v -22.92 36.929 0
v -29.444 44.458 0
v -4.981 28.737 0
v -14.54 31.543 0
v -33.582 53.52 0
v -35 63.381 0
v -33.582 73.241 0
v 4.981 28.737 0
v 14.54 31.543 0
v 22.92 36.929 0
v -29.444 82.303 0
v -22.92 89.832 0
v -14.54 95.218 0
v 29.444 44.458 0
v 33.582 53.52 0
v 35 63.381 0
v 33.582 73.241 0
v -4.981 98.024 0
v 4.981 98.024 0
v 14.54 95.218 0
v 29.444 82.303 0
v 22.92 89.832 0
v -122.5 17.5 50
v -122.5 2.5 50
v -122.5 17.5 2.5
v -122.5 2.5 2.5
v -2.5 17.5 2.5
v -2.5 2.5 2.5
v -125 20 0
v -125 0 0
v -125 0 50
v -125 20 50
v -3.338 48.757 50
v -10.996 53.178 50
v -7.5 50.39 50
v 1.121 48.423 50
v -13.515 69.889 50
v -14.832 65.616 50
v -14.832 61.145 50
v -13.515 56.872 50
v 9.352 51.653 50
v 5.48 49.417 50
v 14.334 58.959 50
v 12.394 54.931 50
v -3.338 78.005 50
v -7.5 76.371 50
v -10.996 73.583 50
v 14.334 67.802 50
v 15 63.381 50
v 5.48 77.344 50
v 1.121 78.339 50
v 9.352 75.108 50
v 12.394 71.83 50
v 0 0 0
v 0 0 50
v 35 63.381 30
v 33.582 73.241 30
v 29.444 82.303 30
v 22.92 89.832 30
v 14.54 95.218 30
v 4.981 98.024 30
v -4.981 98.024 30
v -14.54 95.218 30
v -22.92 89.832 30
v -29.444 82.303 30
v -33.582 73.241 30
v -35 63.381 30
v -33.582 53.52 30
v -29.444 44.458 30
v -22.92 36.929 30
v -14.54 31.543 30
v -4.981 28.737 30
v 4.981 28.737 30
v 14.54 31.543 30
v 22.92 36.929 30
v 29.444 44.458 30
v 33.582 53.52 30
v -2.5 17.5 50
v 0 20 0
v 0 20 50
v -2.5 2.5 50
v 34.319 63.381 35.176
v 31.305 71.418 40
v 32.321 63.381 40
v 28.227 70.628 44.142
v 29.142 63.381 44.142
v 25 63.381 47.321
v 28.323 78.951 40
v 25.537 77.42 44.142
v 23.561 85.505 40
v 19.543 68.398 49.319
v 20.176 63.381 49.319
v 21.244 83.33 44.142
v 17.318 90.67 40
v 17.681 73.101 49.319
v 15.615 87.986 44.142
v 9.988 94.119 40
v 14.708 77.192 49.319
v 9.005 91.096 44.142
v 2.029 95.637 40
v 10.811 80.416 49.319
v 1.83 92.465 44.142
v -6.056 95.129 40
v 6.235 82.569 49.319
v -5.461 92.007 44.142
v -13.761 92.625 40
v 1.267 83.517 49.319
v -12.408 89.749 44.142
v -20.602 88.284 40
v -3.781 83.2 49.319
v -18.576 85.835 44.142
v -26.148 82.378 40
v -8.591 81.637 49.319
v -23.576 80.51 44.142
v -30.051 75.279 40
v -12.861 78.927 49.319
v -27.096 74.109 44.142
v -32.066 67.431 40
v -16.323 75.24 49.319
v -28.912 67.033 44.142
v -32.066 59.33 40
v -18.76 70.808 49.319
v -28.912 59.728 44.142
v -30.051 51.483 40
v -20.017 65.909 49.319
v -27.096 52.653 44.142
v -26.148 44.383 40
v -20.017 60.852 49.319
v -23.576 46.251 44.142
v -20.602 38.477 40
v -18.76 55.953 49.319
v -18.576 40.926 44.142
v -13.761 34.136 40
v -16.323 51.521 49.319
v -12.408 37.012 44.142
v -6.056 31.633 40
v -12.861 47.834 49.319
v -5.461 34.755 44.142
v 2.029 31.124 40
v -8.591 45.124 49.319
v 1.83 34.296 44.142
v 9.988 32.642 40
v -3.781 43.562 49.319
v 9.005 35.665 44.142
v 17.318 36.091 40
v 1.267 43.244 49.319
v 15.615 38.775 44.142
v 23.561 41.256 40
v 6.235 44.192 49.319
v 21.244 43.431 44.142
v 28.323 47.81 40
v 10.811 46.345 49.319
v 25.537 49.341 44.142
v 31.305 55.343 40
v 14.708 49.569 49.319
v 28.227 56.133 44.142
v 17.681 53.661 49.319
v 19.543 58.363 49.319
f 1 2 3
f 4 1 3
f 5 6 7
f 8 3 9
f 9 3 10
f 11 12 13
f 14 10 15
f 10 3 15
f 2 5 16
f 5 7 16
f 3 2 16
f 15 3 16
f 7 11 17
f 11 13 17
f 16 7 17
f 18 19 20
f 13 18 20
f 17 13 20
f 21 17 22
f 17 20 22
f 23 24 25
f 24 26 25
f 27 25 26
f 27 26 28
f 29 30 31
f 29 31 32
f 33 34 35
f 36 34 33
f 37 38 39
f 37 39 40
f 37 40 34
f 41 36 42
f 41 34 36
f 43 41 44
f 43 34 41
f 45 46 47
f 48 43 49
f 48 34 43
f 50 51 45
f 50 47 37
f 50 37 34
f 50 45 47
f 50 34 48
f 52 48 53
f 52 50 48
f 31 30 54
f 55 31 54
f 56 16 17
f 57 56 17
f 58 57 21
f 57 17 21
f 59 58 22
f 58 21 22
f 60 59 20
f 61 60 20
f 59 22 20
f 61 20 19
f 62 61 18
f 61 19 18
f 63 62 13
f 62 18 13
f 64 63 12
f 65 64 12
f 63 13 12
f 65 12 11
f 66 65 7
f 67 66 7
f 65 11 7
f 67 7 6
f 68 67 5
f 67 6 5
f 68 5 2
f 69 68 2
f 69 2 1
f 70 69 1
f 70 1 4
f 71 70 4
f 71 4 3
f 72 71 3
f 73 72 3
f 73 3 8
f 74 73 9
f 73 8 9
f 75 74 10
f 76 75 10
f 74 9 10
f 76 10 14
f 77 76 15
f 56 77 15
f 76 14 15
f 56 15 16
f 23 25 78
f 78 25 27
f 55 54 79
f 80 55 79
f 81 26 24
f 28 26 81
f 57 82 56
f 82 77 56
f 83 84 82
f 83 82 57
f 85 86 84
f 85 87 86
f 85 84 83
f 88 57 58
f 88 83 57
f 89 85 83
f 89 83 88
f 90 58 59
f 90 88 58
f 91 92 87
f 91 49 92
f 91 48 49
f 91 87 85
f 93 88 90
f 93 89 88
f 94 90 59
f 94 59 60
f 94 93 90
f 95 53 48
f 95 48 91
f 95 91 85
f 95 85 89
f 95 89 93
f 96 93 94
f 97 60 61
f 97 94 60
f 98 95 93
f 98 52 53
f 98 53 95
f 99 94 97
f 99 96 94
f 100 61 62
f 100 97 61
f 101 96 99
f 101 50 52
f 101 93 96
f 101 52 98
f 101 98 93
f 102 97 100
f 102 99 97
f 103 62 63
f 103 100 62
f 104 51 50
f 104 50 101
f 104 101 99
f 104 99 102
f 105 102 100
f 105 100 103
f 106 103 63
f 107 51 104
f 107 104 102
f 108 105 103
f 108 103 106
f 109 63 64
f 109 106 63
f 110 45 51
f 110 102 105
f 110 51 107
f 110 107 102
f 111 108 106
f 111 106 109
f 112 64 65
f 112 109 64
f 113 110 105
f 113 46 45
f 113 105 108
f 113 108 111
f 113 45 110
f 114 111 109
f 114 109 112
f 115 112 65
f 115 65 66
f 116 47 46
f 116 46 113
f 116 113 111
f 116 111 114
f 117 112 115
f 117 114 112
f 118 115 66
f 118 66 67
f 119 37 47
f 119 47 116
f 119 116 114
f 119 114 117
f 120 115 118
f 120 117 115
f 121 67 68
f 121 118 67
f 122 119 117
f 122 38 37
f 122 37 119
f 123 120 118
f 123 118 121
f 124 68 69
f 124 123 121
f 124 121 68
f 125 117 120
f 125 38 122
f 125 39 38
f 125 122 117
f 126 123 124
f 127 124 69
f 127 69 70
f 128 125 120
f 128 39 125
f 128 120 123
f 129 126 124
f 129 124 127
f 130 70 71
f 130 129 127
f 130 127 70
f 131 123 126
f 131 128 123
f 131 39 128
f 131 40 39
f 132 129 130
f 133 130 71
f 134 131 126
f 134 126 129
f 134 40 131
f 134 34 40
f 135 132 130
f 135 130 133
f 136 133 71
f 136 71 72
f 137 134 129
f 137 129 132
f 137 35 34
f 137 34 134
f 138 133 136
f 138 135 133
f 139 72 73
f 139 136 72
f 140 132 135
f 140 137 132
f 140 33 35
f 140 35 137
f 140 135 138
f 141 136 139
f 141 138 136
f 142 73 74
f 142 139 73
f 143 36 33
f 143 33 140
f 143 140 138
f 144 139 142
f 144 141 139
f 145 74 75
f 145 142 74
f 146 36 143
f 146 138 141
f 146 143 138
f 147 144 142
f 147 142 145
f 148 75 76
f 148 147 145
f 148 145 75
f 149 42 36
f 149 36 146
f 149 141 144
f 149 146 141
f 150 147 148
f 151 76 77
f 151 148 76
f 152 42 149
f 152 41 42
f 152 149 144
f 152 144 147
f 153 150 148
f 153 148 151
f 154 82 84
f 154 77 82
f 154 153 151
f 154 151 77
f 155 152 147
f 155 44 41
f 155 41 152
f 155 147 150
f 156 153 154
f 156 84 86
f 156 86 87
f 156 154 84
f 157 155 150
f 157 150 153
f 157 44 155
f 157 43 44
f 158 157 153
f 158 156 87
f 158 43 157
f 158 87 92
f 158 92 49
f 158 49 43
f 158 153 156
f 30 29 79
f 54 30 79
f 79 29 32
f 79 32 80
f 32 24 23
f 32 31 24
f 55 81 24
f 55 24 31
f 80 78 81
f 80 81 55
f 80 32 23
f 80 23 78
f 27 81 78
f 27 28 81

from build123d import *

# Parameters (mm, degrees)
F0_W     = 125
F0_H     = 20
F1_DEPTH = 50
F0_R     = 35
F2_R     = 20
F3_T     = -2.5


with BuildPart() as f1:
    # F0 (on Top) → F1 (new body)
    with BuildSketch(Plane.XY):
        with Locations((-62.5, 10)):
            Rectangle(F0_W, F0_H)
    extrude(amount=F1_DEPTH)

    # F3
    f3_openings = [f1.faces().sort_by_distance(p)[0] for p in [
        (-62.5, 10, 50),
    ]]
    offset(amount=F3_T, openings=f3_openings)


with BuildPart() as f1b:
    # F0 (on Top) → F1, piece 2 (new body)
    with BuildSketch(Plane.XY):
        with Locations((0, 63.3805897062)):
            Circle(F0_R)
    extrude(amount=F1_DEPTH)

    # F2
    f2_edges = [f1b.edges().sort_by_distance(p)[0] for p in [
        (-35, 63.38059, 50),
    ]]
    fillet(f2_edges, radius=F2_R)


solid = Compound([f1.part, f1b.part])
